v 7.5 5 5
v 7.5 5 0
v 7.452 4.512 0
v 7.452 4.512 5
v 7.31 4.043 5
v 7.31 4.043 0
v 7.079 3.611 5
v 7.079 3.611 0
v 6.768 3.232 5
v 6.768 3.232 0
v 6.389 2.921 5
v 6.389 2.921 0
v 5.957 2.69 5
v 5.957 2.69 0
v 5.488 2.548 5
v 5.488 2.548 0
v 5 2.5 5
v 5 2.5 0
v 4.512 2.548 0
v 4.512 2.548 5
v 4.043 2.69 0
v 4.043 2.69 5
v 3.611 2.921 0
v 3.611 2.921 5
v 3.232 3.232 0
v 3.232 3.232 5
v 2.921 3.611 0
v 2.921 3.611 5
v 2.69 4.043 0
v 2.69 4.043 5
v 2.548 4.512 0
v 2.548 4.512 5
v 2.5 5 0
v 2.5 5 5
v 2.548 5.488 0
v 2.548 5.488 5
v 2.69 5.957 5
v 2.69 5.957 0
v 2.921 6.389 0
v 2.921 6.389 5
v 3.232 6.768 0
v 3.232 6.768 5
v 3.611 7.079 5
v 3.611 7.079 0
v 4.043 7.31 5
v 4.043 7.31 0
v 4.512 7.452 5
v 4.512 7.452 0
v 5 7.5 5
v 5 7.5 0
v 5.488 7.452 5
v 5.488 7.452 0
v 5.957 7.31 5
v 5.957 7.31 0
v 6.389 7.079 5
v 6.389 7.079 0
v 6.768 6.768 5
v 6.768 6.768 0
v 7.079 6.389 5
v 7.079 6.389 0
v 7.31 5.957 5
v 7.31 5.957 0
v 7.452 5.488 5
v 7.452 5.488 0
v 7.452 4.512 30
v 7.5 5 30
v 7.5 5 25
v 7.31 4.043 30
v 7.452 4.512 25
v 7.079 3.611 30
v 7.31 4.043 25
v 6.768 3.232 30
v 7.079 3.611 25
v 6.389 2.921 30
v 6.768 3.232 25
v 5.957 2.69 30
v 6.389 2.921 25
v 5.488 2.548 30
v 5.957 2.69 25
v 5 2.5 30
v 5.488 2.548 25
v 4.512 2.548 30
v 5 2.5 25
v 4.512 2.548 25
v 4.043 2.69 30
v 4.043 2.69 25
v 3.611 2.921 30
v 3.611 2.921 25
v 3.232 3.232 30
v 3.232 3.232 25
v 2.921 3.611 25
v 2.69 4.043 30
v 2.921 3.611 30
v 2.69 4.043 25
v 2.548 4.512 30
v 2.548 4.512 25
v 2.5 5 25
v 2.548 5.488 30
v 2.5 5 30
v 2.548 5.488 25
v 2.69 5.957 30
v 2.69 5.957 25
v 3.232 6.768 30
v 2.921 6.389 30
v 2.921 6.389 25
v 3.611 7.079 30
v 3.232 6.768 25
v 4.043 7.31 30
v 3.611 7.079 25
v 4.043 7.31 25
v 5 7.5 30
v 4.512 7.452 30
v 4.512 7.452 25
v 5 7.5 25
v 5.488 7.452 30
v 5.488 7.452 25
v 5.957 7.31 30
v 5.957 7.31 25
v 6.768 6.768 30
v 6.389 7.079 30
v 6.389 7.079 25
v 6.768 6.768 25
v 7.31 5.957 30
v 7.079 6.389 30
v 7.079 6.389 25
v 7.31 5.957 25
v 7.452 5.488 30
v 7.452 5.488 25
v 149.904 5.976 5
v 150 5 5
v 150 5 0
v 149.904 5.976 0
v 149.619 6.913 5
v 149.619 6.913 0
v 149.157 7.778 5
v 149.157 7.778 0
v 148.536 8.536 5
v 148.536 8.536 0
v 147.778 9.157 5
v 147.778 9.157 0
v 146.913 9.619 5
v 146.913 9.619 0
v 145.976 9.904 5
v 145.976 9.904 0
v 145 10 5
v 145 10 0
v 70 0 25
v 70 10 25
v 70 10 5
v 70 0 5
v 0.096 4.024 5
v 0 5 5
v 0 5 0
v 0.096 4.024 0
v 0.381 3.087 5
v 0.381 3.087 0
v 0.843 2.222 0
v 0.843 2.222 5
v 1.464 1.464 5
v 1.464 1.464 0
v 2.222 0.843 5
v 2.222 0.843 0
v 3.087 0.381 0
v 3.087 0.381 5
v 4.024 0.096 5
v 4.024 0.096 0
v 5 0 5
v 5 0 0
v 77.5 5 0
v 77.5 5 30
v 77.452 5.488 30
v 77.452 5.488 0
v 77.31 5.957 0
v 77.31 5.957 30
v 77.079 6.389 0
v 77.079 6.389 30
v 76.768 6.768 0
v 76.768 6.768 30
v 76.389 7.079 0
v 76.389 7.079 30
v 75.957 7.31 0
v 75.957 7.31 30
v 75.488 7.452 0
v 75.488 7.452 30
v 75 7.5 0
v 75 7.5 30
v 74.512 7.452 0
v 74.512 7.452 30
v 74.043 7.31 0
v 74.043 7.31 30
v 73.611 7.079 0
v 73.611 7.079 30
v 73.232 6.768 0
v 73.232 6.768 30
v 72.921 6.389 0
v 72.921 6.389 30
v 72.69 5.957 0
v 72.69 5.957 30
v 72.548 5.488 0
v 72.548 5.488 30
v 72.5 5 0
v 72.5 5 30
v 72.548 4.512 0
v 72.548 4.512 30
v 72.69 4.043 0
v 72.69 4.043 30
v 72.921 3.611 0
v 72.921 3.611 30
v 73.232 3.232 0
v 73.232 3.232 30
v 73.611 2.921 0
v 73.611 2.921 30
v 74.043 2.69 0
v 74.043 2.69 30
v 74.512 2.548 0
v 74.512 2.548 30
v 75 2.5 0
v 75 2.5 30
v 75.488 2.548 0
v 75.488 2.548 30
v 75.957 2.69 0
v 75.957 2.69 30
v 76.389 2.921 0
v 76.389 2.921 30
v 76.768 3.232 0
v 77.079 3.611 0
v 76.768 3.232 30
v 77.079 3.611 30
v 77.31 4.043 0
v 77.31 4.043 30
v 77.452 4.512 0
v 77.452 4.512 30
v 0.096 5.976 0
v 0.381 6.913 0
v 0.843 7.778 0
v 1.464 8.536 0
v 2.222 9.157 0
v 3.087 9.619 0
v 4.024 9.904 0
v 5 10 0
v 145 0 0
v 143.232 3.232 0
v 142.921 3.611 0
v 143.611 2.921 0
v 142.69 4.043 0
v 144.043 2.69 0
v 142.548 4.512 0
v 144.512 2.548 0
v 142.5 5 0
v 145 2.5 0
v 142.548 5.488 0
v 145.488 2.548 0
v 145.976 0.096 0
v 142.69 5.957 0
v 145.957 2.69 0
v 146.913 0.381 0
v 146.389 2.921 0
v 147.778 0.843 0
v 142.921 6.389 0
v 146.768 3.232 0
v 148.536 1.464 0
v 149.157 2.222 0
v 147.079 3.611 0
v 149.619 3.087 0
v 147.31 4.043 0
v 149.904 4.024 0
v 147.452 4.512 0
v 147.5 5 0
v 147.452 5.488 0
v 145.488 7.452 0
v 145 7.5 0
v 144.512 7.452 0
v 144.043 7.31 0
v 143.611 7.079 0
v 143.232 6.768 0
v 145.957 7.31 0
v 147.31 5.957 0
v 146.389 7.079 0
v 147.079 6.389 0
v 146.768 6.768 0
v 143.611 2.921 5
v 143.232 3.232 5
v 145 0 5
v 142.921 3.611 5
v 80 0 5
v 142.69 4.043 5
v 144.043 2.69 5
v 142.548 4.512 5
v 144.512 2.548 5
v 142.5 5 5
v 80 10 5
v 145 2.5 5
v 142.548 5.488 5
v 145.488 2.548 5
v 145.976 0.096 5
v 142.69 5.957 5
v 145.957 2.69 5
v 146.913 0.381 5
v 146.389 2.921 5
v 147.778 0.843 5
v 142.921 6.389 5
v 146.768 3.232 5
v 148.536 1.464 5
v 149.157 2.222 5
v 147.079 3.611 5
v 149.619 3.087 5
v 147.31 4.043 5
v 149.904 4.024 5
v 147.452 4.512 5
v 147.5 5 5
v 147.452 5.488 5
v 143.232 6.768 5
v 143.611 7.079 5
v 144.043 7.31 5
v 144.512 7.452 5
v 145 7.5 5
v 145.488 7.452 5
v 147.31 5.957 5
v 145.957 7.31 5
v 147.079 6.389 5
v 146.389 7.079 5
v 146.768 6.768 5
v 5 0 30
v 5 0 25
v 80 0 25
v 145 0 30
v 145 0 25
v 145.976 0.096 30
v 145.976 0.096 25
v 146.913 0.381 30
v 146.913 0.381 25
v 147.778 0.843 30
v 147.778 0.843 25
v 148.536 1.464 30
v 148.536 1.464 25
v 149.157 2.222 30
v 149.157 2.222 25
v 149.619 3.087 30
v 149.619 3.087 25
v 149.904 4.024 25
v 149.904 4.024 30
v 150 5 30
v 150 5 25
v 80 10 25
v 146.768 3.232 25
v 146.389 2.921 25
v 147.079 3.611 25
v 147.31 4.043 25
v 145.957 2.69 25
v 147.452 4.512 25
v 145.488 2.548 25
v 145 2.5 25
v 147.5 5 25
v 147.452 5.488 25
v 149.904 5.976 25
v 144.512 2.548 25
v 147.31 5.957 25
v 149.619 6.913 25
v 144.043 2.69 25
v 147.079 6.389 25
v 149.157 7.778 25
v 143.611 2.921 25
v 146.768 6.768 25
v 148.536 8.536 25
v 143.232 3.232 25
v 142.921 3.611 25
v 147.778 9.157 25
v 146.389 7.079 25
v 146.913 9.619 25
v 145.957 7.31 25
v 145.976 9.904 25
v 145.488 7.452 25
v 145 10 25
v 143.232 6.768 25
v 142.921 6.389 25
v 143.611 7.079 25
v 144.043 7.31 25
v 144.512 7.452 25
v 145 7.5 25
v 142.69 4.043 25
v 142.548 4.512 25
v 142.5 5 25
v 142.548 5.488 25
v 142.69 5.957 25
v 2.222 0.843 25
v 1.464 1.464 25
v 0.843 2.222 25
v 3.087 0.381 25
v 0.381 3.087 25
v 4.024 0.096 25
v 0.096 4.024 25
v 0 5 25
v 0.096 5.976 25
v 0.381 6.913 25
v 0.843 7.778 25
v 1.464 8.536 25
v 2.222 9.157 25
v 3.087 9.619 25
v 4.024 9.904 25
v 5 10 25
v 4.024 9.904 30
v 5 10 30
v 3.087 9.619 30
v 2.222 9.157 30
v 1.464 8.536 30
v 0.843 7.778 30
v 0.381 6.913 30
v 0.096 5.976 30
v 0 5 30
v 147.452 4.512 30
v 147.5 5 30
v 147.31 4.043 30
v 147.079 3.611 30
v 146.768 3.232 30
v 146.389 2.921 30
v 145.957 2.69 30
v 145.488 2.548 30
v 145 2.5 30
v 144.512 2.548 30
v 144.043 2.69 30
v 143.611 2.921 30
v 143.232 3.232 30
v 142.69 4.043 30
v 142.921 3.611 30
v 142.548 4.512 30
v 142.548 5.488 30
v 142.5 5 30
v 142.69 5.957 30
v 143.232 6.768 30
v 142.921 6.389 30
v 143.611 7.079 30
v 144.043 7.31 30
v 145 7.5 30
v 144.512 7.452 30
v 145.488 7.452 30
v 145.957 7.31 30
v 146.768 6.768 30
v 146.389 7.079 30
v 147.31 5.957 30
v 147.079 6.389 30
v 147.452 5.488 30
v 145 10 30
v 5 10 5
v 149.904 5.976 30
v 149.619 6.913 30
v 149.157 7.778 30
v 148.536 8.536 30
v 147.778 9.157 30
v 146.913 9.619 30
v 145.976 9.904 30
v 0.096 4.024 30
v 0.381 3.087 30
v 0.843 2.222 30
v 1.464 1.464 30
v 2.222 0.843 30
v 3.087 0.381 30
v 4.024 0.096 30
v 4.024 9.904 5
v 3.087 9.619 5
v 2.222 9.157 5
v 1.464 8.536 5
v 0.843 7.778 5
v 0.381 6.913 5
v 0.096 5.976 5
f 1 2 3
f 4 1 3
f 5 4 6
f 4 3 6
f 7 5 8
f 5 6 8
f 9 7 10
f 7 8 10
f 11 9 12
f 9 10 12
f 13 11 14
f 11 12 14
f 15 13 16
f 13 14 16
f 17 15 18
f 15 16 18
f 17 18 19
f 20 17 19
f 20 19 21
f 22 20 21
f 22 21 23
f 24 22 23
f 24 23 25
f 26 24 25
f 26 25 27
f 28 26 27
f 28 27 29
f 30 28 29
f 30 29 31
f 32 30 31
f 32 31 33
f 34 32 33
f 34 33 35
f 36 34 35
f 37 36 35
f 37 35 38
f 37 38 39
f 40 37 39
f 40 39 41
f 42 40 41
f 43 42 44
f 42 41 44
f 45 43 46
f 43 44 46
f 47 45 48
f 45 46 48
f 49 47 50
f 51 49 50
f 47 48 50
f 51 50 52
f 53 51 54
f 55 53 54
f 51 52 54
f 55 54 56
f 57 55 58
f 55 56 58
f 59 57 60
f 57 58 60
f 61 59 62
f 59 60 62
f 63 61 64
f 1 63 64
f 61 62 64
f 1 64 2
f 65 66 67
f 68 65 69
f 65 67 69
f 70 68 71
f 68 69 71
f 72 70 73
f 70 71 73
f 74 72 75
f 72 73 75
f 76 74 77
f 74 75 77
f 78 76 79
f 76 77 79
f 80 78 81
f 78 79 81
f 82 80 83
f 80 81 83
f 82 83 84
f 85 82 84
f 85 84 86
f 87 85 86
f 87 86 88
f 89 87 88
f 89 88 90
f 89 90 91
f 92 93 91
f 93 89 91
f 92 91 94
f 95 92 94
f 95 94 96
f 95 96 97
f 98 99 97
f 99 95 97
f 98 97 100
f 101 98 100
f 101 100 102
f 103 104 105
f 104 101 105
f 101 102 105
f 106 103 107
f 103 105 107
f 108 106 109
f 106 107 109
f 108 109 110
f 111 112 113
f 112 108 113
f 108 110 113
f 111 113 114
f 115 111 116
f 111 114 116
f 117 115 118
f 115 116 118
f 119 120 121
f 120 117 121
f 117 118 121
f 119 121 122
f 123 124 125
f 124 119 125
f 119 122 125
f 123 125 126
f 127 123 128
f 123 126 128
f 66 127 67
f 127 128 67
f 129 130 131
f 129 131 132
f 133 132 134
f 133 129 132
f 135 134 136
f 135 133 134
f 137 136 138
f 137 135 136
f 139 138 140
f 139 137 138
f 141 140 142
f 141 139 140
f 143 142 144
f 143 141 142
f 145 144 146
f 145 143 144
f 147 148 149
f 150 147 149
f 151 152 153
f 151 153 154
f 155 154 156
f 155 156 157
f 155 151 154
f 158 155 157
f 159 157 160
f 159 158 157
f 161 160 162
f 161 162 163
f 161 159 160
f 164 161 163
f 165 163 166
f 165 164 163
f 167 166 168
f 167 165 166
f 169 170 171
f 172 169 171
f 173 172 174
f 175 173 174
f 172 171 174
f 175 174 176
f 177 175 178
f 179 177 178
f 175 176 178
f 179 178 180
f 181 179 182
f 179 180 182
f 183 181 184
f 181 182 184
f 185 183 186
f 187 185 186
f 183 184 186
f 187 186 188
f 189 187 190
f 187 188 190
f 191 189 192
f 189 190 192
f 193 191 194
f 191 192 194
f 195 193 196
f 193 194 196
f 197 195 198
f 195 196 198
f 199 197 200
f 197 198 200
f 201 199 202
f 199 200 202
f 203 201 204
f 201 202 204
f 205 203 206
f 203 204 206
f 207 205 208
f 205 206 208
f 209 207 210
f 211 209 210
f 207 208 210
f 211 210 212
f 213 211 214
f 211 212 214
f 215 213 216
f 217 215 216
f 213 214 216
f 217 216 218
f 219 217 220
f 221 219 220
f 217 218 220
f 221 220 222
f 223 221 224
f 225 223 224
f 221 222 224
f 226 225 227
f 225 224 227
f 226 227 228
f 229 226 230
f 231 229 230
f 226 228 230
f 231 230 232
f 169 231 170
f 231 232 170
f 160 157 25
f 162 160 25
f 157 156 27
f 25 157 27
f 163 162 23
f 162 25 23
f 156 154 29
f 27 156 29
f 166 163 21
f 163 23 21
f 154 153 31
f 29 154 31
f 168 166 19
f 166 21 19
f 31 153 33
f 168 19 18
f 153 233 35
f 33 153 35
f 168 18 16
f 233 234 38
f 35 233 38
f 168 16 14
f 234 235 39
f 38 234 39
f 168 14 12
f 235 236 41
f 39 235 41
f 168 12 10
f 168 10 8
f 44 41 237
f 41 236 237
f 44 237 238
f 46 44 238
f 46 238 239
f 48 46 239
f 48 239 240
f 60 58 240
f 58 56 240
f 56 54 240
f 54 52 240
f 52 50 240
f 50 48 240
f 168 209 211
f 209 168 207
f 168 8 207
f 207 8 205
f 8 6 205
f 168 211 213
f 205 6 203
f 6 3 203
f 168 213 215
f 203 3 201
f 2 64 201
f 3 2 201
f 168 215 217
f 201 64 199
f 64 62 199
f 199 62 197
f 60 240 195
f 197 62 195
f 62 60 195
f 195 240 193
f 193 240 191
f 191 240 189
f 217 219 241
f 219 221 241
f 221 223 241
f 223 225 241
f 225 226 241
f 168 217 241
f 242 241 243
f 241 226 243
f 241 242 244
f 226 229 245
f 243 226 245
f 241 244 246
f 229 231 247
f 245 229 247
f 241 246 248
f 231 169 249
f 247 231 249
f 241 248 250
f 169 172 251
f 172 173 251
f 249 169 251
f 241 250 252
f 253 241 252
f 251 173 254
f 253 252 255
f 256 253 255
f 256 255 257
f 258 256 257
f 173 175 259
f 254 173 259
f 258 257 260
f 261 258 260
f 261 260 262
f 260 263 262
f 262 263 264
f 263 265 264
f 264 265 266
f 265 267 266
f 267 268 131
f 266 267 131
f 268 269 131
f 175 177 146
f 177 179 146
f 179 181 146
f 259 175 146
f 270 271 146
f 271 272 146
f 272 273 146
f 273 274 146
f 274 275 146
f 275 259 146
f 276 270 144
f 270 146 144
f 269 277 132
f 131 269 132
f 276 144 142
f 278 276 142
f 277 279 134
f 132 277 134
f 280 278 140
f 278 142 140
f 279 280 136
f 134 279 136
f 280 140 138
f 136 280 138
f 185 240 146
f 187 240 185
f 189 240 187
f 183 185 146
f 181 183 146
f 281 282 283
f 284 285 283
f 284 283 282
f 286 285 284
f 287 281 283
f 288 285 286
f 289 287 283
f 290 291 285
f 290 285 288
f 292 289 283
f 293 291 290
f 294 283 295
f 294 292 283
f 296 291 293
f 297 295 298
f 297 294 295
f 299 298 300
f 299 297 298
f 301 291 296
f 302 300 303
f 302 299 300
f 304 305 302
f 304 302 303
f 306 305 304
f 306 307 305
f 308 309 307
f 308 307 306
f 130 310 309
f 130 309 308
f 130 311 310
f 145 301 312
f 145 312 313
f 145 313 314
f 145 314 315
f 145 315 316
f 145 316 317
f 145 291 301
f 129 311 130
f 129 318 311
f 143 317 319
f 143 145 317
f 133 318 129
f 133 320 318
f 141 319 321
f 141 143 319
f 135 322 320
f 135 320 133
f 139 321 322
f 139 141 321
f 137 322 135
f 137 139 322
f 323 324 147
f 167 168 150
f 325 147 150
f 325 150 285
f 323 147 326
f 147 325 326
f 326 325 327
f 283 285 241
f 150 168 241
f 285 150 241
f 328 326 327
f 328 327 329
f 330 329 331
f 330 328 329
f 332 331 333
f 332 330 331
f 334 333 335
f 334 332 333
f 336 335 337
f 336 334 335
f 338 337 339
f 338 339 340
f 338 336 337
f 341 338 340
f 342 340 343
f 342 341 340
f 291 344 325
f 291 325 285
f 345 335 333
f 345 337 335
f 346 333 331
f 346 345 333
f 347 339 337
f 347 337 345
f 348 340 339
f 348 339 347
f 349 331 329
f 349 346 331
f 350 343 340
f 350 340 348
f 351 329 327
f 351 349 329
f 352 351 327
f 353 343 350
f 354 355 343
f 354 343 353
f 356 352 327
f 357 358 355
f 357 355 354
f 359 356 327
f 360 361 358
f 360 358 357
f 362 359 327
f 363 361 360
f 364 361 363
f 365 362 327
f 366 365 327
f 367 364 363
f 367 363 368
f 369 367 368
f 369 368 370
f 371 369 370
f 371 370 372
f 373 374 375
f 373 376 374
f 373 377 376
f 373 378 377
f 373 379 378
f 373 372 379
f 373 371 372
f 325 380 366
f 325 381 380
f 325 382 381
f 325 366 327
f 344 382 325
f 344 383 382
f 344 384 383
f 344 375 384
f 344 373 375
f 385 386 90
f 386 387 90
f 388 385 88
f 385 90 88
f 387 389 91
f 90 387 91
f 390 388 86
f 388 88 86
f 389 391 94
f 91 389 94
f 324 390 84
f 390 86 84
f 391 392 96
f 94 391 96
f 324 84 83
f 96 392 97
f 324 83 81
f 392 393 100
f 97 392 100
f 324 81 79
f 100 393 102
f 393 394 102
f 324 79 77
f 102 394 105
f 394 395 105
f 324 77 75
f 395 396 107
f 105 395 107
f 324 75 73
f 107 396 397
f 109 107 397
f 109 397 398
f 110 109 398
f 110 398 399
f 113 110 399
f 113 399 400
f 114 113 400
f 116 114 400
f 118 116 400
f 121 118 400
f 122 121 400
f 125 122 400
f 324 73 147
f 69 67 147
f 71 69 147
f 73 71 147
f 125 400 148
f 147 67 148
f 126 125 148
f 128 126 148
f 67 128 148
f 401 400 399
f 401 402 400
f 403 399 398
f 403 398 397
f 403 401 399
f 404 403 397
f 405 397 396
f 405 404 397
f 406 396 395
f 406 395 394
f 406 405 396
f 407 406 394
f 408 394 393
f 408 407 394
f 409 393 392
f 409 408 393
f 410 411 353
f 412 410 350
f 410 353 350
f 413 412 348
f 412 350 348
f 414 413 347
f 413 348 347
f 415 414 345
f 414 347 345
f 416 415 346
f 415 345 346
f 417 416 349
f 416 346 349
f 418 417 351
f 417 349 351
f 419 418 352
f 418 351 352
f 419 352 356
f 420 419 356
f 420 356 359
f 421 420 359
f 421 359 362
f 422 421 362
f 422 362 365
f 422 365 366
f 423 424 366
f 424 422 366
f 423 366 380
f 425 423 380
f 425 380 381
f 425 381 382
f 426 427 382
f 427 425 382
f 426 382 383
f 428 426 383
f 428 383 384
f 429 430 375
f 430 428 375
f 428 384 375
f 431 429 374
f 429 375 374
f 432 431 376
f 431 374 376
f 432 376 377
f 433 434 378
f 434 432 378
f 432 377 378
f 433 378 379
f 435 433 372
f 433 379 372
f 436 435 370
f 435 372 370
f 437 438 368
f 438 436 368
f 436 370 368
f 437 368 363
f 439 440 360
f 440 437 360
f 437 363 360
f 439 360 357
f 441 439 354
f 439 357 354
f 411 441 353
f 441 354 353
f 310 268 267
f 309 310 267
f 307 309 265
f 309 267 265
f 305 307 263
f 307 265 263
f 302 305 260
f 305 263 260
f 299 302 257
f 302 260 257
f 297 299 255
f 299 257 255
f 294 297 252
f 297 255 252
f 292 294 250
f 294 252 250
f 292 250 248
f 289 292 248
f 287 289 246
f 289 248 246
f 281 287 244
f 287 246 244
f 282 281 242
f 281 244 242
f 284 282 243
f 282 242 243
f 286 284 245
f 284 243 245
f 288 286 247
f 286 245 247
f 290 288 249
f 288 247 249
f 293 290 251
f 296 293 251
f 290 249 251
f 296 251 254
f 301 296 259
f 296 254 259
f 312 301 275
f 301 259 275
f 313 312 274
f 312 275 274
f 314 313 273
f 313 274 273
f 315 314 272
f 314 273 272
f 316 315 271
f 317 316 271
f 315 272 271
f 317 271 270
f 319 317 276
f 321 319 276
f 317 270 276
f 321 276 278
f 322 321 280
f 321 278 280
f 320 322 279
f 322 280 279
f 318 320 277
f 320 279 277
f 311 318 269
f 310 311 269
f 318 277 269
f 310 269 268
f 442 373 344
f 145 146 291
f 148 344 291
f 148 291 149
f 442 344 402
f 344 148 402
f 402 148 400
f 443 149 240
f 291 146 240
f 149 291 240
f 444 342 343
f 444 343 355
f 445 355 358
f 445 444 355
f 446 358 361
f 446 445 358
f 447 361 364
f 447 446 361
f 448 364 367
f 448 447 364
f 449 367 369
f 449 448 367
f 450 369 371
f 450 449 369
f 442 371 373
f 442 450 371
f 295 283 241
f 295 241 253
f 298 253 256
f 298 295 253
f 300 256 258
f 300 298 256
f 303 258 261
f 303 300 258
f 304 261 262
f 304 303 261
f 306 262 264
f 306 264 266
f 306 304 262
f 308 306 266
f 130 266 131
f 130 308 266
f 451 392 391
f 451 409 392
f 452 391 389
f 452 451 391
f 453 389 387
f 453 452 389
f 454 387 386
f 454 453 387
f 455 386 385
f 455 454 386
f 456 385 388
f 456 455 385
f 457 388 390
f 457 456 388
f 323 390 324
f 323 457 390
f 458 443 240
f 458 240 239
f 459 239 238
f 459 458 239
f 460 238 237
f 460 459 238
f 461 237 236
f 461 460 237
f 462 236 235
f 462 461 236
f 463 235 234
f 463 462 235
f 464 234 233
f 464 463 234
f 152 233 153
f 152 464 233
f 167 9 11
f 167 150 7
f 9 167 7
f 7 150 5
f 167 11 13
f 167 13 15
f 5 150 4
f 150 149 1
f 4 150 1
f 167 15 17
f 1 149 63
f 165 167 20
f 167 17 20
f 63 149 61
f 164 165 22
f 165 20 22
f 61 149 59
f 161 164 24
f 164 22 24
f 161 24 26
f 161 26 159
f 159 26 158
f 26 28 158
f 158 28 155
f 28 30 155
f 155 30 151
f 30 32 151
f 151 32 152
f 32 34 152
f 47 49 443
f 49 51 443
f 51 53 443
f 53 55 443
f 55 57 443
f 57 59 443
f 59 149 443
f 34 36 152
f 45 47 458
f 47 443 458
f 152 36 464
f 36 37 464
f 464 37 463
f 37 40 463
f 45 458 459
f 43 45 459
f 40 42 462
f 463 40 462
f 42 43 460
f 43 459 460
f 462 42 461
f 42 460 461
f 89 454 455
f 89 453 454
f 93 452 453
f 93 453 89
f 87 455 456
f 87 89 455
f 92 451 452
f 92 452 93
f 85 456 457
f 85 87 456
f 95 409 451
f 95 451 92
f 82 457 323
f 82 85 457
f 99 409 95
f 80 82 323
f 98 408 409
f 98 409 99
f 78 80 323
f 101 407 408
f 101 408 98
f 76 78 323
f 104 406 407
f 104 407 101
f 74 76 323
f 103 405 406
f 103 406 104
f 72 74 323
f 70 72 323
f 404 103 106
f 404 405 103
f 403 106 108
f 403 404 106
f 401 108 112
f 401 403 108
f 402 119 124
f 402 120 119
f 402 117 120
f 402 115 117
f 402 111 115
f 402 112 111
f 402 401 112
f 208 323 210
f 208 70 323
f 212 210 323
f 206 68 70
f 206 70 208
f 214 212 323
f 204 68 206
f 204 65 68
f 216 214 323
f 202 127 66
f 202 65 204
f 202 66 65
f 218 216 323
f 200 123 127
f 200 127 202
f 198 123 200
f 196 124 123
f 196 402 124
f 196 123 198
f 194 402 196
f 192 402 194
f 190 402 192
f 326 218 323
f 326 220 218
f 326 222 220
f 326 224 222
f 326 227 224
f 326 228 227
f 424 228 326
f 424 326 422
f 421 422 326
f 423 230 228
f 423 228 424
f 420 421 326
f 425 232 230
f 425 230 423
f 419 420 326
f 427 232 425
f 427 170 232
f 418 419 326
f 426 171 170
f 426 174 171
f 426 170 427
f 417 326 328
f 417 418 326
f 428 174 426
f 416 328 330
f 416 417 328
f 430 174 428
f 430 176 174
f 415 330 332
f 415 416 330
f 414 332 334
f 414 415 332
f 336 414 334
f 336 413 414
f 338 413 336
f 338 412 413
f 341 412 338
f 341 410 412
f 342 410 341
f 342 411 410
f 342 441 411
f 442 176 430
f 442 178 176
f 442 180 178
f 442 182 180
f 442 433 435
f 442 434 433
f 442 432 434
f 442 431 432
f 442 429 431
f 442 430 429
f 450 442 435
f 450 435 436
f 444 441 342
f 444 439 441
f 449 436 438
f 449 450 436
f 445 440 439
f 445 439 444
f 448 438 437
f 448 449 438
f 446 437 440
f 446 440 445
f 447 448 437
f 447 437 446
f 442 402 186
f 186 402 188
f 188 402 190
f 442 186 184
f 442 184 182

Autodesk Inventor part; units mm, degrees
ref_plane "YZ Plane" through (0, 0, 0) normal (1, 0, 0) x (0, 1, 0)
ref_plane "XZ Plane" through (0, 0, 0) normal (0, 1, 0) x (-1, 0, 0)
ref_plane "XY Plane" through (0, 0, 0) normal (0, 0, 1) x (1, 0, 0)
sketch "Sketch1" plane through (0, 0, 0) normal (0, 0, 1) x (1, 0, 0)
  line L0 (0, 0) -> (150, 0)
  line L1 (150, 0) -> (150, 10)
  line L2 (150, 10) -> (0, 10)
  line L3 (0, 10) -> (0, 0)
  circle A0 centre (5, 5) radius 2.5
  circle A1 centre (145, 5) radius 2.5
  dimension "d0" = 5
  dimension "d1" = 5
  dimension "d2" = 10
  dimension "d3" = 5
  dimension "d4" = 150
  dimension "d5" = 5
  dimension "d6" = 5
  dimension "d7" = 5
extrude "Extrusion1" add sketch "Sketch1" along normal blind 30
sketch "Sketch2" plane through (0, 10, 0) normal (0, 1, 0) x (1, 0, 0)
  point P0 (0, 0)
sketch "Sketch3" plane through (0, 10, 0) normal (0, 1, 0) x (1, 0, 0)
  line L0 (0, 0) -> (0, -30) projected
  line L1 (0, -25) -> (70, -25)
  line L2 (70, -25) -> (70, -5)
  line L3 (70, -5) -> (0, -5)
  line L4 (0, -5) -> (0, -25)
  line L5 (150, 0) -> (150, -30) projected
  line L6 (150, -25) -> (80, -25)
  line L7 (80, -25) -> (80, -5)
  line L8 (80, -5) -> (150, -5)
  line L9 (150, -5) -> (150, -25)
  line L10 (150, 0) -> (0, 0) projected
  line L11 (150, -30) -> (0, -30) projected
  point P0 (0, -5)
  dimension "d10" = 70
  dimension "d11" = 70
  dimension "d12" = 5
  dimension "d13" = 5
  dimension "d14" = 5
  dimension "d15" = 5
extrude "Extrusion2" cut sketch "Sketch3" against normal blind 10 contours L3 L2 L1 L0 | L5 L6 L7 L8
fillet "Fillet1" radius 5 8 edges at (0, 10, 27.5) (150, 10, 27.5) (150, 10, 2.5) (0, 10, 2.5) (150, 0, 27.5) (150, 0, 2.5) (0, 0, 27.5) (0, 0, 2.5)
sketch "Sketch4" plane through (0, 0, 30) normal (0, 0, 1) x (1, 0, 0)
  circle A0 centre (75, 5) radius 2.5
  line L0 (5, 0) -> (145, 0) projected
  circle A1 centre (5, 5) radius 2.5 projected
  point P0 (0, 0)
  dimension "d19" = 5
  dimension "d20" = 5
  dimension "d21" = 70
extrude "Extrusion3" cut sketch "Sketch4" against normal blind 30 contours A0
properties part number "Joint 1"
